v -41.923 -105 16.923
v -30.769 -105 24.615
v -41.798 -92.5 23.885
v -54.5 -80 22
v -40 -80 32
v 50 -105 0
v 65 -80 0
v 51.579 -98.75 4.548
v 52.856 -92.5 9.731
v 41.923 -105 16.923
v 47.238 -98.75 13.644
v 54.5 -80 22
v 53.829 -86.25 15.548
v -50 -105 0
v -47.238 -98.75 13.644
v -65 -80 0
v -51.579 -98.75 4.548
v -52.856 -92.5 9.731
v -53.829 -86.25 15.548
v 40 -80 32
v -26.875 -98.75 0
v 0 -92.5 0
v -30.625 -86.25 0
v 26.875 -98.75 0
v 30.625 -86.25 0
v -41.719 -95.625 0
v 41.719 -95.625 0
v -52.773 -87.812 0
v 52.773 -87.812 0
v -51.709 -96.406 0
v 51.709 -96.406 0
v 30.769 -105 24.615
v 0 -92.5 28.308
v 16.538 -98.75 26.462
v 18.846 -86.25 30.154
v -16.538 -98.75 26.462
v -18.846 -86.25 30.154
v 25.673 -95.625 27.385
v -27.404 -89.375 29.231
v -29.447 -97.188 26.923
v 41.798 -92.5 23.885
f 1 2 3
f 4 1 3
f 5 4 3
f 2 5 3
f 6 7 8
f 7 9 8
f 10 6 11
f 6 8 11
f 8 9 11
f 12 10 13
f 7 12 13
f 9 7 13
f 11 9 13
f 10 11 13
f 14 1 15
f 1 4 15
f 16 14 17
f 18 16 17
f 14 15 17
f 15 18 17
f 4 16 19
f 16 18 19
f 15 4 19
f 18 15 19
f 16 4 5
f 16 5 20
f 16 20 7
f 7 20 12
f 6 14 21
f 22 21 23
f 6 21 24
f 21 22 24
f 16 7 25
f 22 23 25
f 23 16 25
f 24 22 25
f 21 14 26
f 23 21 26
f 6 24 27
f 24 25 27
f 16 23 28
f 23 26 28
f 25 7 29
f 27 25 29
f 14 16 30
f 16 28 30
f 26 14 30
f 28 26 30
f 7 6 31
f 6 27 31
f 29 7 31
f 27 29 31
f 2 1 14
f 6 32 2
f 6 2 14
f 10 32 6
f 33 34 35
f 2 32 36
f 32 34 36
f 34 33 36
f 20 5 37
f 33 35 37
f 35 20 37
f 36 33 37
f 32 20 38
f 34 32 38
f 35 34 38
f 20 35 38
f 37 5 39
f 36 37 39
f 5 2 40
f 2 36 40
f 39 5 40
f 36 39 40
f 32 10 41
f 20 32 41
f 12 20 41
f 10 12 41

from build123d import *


with BuildPart() as f4:
    # F3 (on offset) → F4 section 0
    with BuildSketch(Plane.XZ.offset(105)):
        Polygon((-41.923077, 16.923077), (-50, 0), (50, 0), (41.923077, 16.923077), (30.769231, 24.615385), (0, 24.615385), (-30.769231, 24.615385), align=None)
    # F1 (on offset) → F4 section 1
    with BuildSketch(Plane.XZ.offset(80)):
        Polygon((-54.5, 22), (-65, 0), (65, 0), (54.5, 22), (40, 32), (0, 32), (-40, 32), align=None)
    loft()


solid = f4.part
